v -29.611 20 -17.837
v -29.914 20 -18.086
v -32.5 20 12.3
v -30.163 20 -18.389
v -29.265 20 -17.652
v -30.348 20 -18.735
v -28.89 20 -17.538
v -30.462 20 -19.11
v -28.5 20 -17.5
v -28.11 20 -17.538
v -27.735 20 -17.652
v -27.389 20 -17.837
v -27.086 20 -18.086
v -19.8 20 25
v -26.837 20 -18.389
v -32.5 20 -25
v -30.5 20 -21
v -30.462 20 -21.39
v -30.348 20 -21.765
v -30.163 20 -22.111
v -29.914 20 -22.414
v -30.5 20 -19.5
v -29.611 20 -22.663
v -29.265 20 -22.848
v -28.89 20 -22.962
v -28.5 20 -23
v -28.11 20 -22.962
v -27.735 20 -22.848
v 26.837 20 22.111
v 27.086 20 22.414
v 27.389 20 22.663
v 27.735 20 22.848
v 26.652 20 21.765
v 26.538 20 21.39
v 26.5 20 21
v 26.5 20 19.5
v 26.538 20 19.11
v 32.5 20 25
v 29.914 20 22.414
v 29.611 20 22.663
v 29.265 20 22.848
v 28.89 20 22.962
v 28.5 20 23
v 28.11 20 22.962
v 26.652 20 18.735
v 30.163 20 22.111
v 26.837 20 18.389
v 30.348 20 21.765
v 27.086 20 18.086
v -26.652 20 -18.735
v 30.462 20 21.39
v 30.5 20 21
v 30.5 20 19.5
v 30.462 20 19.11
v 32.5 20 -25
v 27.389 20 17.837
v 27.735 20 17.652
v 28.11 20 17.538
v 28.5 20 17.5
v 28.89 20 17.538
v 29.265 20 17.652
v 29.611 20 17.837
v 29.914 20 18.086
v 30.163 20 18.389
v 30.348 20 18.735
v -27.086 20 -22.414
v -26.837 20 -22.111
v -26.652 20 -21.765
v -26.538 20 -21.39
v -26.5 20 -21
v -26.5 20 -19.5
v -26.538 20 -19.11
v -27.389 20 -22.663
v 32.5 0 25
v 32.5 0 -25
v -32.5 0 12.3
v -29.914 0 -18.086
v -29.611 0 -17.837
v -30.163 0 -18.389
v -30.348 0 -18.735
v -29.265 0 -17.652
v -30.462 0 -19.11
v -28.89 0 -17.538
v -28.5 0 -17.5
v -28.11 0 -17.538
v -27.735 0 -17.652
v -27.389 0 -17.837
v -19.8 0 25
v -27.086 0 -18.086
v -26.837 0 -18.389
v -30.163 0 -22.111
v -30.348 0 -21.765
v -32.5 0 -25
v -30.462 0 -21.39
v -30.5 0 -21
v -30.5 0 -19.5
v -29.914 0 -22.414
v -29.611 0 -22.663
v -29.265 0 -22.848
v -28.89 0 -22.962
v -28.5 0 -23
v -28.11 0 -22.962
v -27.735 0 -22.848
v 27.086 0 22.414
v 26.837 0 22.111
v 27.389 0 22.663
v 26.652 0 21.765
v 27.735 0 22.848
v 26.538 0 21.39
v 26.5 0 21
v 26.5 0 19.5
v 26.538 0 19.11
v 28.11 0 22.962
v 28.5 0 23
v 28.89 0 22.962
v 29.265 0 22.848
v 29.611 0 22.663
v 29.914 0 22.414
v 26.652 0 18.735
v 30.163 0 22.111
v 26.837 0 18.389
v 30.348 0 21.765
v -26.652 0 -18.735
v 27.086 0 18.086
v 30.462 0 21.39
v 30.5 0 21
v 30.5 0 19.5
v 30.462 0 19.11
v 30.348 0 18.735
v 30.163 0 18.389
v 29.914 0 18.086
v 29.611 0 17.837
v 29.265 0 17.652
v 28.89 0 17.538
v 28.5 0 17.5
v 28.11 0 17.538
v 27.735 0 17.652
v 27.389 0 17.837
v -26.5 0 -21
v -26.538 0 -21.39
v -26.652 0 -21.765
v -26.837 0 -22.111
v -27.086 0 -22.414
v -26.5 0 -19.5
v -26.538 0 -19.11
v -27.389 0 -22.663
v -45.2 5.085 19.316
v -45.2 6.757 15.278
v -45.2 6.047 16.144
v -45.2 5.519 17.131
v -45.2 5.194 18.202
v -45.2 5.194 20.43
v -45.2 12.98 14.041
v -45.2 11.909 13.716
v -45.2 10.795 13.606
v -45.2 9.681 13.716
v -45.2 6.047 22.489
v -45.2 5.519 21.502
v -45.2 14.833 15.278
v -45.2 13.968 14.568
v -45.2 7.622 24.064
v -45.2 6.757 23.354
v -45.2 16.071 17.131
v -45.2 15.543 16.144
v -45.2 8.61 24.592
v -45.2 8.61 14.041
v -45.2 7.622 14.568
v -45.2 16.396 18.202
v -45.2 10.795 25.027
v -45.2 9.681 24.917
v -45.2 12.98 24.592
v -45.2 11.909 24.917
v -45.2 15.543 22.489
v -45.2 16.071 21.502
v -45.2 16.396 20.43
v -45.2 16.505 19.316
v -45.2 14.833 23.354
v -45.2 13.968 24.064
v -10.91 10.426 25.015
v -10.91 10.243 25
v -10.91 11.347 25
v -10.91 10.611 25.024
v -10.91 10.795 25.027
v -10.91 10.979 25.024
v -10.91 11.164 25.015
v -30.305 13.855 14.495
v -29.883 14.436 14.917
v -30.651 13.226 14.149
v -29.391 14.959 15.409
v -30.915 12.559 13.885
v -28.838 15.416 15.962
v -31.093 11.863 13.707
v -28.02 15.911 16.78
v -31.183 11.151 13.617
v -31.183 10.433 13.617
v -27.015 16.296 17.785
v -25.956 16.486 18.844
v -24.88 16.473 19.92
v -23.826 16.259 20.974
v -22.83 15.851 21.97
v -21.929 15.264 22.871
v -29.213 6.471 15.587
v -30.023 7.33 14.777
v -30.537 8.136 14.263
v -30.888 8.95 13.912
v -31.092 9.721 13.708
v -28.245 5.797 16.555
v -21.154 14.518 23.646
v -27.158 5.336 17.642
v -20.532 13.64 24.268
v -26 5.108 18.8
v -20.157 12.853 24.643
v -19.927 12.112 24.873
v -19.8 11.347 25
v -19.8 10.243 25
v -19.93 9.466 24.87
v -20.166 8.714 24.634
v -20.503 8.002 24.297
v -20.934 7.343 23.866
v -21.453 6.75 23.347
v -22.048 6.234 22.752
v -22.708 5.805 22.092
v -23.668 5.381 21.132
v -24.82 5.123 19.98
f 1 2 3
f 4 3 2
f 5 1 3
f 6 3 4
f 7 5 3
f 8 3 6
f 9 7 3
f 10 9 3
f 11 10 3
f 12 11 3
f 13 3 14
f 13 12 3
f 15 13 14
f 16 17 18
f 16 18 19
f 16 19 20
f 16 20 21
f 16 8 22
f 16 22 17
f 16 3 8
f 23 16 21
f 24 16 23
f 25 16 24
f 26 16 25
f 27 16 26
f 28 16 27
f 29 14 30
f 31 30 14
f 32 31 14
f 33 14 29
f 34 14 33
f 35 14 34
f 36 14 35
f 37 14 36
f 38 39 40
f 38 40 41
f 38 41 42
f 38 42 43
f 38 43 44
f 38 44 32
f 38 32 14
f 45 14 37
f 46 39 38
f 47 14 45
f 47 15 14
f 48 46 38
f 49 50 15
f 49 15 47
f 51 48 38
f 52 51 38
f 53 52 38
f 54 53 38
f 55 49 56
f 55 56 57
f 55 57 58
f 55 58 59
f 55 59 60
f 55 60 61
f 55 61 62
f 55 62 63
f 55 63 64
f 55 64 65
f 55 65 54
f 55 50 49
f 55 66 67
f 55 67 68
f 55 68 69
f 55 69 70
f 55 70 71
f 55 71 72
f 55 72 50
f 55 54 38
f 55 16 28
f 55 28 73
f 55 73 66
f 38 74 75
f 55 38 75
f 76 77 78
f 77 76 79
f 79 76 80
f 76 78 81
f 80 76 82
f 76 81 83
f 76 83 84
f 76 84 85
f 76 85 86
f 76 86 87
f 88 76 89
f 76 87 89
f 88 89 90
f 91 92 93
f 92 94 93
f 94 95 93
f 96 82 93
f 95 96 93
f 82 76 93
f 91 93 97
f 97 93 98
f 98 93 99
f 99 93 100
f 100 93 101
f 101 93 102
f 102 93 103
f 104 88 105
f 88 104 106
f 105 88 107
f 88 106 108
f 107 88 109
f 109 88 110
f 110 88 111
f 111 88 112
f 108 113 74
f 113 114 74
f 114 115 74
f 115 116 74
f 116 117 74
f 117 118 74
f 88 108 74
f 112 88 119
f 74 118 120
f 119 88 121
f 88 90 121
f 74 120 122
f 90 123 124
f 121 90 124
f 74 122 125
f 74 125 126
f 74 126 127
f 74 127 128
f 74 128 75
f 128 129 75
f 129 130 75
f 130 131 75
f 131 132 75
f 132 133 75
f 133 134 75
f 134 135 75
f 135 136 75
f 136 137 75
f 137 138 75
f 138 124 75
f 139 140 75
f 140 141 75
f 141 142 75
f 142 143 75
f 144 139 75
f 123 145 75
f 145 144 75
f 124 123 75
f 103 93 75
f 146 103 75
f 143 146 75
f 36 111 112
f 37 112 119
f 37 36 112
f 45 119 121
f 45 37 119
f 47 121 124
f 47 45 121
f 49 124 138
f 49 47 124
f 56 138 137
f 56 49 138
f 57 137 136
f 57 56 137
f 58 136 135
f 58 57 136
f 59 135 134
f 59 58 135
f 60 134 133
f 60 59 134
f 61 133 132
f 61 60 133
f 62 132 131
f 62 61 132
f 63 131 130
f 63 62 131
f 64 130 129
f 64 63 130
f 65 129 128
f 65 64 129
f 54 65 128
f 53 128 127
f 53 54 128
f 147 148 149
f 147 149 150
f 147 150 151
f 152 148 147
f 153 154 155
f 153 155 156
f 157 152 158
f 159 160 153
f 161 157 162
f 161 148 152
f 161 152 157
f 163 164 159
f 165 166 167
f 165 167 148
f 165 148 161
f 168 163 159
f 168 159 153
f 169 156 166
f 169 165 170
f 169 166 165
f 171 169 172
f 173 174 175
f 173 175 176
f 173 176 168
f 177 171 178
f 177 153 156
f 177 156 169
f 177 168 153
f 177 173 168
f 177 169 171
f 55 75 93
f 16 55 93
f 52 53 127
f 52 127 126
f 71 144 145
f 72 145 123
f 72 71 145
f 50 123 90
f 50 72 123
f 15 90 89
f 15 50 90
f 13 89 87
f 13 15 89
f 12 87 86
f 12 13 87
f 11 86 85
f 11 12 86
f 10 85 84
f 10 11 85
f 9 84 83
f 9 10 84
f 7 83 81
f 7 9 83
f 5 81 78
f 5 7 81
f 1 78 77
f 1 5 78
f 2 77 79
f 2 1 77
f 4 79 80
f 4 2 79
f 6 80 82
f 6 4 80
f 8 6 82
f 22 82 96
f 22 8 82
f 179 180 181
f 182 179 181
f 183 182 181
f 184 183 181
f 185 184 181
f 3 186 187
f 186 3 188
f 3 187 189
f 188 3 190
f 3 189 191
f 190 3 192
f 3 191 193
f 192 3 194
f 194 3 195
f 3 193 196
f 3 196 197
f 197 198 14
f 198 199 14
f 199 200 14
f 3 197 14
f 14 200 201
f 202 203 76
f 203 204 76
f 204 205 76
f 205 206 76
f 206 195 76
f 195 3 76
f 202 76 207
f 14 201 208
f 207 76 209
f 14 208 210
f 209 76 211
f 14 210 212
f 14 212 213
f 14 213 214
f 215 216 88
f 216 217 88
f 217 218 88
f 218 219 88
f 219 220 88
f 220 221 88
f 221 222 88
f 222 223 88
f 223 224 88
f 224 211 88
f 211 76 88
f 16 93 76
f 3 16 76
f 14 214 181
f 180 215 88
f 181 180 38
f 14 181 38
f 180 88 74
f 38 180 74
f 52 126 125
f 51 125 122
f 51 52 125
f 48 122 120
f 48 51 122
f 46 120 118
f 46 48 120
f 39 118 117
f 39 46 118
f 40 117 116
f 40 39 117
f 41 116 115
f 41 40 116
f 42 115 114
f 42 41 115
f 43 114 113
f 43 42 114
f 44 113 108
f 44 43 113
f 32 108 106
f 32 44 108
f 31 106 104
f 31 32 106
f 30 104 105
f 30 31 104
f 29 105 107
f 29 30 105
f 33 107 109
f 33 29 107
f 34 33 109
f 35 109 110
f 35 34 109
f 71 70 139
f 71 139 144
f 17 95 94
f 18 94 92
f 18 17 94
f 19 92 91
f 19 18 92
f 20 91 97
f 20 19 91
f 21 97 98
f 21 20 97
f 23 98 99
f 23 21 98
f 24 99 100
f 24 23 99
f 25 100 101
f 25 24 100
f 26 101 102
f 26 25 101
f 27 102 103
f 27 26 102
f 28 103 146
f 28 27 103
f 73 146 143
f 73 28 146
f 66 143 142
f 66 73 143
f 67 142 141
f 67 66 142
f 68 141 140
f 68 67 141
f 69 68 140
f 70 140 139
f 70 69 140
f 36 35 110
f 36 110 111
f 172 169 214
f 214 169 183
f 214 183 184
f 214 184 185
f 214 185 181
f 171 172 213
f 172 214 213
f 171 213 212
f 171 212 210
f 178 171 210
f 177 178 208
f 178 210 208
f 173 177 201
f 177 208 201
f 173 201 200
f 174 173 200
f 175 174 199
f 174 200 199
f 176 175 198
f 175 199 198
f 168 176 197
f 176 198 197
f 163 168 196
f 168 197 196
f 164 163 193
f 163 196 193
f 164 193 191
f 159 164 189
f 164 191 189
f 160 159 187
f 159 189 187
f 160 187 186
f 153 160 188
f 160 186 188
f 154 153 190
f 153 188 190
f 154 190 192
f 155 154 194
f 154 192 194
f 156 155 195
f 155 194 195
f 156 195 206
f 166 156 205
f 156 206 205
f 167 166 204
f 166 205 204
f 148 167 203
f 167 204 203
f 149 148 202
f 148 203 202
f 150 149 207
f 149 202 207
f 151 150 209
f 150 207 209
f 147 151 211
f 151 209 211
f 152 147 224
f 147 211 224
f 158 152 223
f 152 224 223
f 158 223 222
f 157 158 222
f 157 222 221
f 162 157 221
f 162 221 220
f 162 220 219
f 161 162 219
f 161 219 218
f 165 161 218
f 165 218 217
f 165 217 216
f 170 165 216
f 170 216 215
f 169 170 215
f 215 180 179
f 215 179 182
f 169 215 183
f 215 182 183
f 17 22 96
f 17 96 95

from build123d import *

# Parameters (mm, degrees)
BOSS_EXTRUDE1_DEPTH      = 20
BOSS_EXTRUDE2_DEPTH      = 12.7
BOSS_EXTRUDE2_DEPTH_BACK = 21.59
SKETCH2_R                = 5.710413334
CUT_EXTRUDE1_DEPTH       = 56.401981837


with BuildPart() as part:
    # Sketch1 → Boss-Extrude1 (new body)
    with BuildSketch(Plane(origin=(0, 0, 0), x_dir=(1, 0, 0), z_dir=(0, 1, 0))):
        Polygon((-32.500000024, -12.3), (-19.800000024, -25), (32.500000024, -25), (32.500000024, 25), (-32.500000024, 25), align=None)
    extrude(amount=BOSS_EXTRUDE1_DEPTH)

    # Sketch2 → Boss-Extrude2 (add, two sides: drawn at the far end of the back side and taken through both)
    with BuildSketch(Plane.ZY.offset(32.500000024).offset(-BOSS_EXTRUDE2_DEPTH_BACK)):
        with Locations((19.316364111, 10.795)):
            Circle(SKETCH2_R)
    extrude(amount=BOSS_EXTRUDE2_DEPTH + BOSS_EXTRUDE2_DEPTH_BACK)

    # Sketch3 → Cut-Extrude1 (cut, through all)
    with BuildSketch(Plane(origin=(0, 20, 0), x_dir=(1, 0, 0), z_dir=(0, 1, 0))):
        with BuildLine():
            Line((30.500000024, -19.5), (30.500000024, -21))
            ThreePointArc((30.500000024, -21), (28.500000024, -23), (26.500000024, -21))
            Line((26.500000024, -21), (26.500000024, -19.5))
            ThreePointArc((26.500000024, -19.5), (28.500000024, -17.5), (30.500000024, -19.5))
        make_face()
        with BuildLine():
            Line((-26.500000024, 21), (-26.500000024, 19.5))
            ThreePointArc((-26.500000024, 19.5), (-28.500000024, 17.5), (-30.500000024, 19.5))
            Line((-30.500000024, 19.5), (-30.500000024, 21))
            ThreePointArc((-30.500000024, 21), (-28.500000024, 23), (-26.500000024, 21))
        make_face()
    extrude(amount=-CUT_EXTRUDE1_DEPTH, mode=Mode.SUBTRACT)


solid = part.part
